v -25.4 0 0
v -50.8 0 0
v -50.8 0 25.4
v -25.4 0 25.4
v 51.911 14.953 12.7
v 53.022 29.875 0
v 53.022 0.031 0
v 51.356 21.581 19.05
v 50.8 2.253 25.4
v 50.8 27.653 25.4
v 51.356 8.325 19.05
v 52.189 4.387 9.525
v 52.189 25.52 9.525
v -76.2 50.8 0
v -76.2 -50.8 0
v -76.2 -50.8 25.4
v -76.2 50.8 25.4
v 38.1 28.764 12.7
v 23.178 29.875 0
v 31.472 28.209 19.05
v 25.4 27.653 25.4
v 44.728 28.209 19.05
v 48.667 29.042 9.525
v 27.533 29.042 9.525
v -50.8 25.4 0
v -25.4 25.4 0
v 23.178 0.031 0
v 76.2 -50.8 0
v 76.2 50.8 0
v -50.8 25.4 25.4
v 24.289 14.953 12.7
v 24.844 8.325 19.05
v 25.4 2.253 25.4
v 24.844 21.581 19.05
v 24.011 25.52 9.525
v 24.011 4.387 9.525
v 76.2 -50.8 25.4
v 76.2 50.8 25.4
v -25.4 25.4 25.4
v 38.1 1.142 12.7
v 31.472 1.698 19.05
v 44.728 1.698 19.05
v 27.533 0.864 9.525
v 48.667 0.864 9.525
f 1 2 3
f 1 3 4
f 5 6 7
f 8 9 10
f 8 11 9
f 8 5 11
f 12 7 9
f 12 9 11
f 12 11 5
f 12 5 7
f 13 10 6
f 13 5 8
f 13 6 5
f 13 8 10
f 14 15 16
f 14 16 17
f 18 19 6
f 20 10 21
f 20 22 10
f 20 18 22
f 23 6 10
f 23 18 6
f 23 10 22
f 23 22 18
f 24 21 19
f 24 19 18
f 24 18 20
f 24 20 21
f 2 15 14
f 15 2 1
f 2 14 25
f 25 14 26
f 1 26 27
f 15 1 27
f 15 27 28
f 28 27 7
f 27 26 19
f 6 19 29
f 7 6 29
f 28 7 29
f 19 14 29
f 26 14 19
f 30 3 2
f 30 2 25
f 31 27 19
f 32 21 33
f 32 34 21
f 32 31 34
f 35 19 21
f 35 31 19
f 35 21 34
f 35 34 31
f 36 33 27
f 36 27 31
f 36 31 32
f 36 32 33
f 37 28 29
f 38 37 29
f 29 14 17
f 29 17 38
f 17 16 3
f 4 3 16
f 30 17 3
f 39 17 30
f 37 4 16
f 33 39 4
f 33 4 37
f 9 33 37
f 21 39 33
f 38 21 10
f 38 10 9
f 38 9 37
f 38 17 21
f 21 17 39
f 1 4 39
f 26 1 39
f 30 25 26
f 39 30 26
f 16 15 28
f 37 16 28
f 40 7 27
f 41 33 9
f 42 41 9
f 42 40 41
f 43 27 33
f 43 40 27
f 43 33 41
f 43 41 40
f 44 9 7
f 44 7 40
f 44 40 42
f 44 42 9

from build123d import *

# Parameters (mm, degrees)
F0_W     = 152.4
F0_H     = 101.6
F1_DEPTH = 25.4
F2_W     = 25.4
F2_H     = 25.4
F3_DEPTH = 25.401
F4_W     = 25.4
F4_H     = 25.4
F5_DEPTH = 25.401
F5_TAPER = -5


with BuildPart() as f1:
    # F0 (on Top) → F1 (new body)
    with BuildSketch(Plane.XY):
        Rectangle(F0_W, F0_H)
    extrude(amount=F1_DEPTH)

    # F2 (on face) → F3 (cut, through all)
    with BuildSketch(Plane.XY.offset(25.4)):
        with Locations((-38.1, 12.7)):
            Rectangle(F2_W, F2_H)
    extrude(amount=-F3_DEPTH, mode=Mode.SUBTRACT)

    # F4 (on face) → F5 (cut, through all)
    with BuildSketch(Plane.XY.offset(25.4)):
        with Locations((38.1, 14.9531663823)):
            Rectangle(F4_W, F4_H)
    extrude(amount=-F5_DEPTH, taper=F5_TAPER, mode=Mode.SUBTRACT)


solid = f1.part
